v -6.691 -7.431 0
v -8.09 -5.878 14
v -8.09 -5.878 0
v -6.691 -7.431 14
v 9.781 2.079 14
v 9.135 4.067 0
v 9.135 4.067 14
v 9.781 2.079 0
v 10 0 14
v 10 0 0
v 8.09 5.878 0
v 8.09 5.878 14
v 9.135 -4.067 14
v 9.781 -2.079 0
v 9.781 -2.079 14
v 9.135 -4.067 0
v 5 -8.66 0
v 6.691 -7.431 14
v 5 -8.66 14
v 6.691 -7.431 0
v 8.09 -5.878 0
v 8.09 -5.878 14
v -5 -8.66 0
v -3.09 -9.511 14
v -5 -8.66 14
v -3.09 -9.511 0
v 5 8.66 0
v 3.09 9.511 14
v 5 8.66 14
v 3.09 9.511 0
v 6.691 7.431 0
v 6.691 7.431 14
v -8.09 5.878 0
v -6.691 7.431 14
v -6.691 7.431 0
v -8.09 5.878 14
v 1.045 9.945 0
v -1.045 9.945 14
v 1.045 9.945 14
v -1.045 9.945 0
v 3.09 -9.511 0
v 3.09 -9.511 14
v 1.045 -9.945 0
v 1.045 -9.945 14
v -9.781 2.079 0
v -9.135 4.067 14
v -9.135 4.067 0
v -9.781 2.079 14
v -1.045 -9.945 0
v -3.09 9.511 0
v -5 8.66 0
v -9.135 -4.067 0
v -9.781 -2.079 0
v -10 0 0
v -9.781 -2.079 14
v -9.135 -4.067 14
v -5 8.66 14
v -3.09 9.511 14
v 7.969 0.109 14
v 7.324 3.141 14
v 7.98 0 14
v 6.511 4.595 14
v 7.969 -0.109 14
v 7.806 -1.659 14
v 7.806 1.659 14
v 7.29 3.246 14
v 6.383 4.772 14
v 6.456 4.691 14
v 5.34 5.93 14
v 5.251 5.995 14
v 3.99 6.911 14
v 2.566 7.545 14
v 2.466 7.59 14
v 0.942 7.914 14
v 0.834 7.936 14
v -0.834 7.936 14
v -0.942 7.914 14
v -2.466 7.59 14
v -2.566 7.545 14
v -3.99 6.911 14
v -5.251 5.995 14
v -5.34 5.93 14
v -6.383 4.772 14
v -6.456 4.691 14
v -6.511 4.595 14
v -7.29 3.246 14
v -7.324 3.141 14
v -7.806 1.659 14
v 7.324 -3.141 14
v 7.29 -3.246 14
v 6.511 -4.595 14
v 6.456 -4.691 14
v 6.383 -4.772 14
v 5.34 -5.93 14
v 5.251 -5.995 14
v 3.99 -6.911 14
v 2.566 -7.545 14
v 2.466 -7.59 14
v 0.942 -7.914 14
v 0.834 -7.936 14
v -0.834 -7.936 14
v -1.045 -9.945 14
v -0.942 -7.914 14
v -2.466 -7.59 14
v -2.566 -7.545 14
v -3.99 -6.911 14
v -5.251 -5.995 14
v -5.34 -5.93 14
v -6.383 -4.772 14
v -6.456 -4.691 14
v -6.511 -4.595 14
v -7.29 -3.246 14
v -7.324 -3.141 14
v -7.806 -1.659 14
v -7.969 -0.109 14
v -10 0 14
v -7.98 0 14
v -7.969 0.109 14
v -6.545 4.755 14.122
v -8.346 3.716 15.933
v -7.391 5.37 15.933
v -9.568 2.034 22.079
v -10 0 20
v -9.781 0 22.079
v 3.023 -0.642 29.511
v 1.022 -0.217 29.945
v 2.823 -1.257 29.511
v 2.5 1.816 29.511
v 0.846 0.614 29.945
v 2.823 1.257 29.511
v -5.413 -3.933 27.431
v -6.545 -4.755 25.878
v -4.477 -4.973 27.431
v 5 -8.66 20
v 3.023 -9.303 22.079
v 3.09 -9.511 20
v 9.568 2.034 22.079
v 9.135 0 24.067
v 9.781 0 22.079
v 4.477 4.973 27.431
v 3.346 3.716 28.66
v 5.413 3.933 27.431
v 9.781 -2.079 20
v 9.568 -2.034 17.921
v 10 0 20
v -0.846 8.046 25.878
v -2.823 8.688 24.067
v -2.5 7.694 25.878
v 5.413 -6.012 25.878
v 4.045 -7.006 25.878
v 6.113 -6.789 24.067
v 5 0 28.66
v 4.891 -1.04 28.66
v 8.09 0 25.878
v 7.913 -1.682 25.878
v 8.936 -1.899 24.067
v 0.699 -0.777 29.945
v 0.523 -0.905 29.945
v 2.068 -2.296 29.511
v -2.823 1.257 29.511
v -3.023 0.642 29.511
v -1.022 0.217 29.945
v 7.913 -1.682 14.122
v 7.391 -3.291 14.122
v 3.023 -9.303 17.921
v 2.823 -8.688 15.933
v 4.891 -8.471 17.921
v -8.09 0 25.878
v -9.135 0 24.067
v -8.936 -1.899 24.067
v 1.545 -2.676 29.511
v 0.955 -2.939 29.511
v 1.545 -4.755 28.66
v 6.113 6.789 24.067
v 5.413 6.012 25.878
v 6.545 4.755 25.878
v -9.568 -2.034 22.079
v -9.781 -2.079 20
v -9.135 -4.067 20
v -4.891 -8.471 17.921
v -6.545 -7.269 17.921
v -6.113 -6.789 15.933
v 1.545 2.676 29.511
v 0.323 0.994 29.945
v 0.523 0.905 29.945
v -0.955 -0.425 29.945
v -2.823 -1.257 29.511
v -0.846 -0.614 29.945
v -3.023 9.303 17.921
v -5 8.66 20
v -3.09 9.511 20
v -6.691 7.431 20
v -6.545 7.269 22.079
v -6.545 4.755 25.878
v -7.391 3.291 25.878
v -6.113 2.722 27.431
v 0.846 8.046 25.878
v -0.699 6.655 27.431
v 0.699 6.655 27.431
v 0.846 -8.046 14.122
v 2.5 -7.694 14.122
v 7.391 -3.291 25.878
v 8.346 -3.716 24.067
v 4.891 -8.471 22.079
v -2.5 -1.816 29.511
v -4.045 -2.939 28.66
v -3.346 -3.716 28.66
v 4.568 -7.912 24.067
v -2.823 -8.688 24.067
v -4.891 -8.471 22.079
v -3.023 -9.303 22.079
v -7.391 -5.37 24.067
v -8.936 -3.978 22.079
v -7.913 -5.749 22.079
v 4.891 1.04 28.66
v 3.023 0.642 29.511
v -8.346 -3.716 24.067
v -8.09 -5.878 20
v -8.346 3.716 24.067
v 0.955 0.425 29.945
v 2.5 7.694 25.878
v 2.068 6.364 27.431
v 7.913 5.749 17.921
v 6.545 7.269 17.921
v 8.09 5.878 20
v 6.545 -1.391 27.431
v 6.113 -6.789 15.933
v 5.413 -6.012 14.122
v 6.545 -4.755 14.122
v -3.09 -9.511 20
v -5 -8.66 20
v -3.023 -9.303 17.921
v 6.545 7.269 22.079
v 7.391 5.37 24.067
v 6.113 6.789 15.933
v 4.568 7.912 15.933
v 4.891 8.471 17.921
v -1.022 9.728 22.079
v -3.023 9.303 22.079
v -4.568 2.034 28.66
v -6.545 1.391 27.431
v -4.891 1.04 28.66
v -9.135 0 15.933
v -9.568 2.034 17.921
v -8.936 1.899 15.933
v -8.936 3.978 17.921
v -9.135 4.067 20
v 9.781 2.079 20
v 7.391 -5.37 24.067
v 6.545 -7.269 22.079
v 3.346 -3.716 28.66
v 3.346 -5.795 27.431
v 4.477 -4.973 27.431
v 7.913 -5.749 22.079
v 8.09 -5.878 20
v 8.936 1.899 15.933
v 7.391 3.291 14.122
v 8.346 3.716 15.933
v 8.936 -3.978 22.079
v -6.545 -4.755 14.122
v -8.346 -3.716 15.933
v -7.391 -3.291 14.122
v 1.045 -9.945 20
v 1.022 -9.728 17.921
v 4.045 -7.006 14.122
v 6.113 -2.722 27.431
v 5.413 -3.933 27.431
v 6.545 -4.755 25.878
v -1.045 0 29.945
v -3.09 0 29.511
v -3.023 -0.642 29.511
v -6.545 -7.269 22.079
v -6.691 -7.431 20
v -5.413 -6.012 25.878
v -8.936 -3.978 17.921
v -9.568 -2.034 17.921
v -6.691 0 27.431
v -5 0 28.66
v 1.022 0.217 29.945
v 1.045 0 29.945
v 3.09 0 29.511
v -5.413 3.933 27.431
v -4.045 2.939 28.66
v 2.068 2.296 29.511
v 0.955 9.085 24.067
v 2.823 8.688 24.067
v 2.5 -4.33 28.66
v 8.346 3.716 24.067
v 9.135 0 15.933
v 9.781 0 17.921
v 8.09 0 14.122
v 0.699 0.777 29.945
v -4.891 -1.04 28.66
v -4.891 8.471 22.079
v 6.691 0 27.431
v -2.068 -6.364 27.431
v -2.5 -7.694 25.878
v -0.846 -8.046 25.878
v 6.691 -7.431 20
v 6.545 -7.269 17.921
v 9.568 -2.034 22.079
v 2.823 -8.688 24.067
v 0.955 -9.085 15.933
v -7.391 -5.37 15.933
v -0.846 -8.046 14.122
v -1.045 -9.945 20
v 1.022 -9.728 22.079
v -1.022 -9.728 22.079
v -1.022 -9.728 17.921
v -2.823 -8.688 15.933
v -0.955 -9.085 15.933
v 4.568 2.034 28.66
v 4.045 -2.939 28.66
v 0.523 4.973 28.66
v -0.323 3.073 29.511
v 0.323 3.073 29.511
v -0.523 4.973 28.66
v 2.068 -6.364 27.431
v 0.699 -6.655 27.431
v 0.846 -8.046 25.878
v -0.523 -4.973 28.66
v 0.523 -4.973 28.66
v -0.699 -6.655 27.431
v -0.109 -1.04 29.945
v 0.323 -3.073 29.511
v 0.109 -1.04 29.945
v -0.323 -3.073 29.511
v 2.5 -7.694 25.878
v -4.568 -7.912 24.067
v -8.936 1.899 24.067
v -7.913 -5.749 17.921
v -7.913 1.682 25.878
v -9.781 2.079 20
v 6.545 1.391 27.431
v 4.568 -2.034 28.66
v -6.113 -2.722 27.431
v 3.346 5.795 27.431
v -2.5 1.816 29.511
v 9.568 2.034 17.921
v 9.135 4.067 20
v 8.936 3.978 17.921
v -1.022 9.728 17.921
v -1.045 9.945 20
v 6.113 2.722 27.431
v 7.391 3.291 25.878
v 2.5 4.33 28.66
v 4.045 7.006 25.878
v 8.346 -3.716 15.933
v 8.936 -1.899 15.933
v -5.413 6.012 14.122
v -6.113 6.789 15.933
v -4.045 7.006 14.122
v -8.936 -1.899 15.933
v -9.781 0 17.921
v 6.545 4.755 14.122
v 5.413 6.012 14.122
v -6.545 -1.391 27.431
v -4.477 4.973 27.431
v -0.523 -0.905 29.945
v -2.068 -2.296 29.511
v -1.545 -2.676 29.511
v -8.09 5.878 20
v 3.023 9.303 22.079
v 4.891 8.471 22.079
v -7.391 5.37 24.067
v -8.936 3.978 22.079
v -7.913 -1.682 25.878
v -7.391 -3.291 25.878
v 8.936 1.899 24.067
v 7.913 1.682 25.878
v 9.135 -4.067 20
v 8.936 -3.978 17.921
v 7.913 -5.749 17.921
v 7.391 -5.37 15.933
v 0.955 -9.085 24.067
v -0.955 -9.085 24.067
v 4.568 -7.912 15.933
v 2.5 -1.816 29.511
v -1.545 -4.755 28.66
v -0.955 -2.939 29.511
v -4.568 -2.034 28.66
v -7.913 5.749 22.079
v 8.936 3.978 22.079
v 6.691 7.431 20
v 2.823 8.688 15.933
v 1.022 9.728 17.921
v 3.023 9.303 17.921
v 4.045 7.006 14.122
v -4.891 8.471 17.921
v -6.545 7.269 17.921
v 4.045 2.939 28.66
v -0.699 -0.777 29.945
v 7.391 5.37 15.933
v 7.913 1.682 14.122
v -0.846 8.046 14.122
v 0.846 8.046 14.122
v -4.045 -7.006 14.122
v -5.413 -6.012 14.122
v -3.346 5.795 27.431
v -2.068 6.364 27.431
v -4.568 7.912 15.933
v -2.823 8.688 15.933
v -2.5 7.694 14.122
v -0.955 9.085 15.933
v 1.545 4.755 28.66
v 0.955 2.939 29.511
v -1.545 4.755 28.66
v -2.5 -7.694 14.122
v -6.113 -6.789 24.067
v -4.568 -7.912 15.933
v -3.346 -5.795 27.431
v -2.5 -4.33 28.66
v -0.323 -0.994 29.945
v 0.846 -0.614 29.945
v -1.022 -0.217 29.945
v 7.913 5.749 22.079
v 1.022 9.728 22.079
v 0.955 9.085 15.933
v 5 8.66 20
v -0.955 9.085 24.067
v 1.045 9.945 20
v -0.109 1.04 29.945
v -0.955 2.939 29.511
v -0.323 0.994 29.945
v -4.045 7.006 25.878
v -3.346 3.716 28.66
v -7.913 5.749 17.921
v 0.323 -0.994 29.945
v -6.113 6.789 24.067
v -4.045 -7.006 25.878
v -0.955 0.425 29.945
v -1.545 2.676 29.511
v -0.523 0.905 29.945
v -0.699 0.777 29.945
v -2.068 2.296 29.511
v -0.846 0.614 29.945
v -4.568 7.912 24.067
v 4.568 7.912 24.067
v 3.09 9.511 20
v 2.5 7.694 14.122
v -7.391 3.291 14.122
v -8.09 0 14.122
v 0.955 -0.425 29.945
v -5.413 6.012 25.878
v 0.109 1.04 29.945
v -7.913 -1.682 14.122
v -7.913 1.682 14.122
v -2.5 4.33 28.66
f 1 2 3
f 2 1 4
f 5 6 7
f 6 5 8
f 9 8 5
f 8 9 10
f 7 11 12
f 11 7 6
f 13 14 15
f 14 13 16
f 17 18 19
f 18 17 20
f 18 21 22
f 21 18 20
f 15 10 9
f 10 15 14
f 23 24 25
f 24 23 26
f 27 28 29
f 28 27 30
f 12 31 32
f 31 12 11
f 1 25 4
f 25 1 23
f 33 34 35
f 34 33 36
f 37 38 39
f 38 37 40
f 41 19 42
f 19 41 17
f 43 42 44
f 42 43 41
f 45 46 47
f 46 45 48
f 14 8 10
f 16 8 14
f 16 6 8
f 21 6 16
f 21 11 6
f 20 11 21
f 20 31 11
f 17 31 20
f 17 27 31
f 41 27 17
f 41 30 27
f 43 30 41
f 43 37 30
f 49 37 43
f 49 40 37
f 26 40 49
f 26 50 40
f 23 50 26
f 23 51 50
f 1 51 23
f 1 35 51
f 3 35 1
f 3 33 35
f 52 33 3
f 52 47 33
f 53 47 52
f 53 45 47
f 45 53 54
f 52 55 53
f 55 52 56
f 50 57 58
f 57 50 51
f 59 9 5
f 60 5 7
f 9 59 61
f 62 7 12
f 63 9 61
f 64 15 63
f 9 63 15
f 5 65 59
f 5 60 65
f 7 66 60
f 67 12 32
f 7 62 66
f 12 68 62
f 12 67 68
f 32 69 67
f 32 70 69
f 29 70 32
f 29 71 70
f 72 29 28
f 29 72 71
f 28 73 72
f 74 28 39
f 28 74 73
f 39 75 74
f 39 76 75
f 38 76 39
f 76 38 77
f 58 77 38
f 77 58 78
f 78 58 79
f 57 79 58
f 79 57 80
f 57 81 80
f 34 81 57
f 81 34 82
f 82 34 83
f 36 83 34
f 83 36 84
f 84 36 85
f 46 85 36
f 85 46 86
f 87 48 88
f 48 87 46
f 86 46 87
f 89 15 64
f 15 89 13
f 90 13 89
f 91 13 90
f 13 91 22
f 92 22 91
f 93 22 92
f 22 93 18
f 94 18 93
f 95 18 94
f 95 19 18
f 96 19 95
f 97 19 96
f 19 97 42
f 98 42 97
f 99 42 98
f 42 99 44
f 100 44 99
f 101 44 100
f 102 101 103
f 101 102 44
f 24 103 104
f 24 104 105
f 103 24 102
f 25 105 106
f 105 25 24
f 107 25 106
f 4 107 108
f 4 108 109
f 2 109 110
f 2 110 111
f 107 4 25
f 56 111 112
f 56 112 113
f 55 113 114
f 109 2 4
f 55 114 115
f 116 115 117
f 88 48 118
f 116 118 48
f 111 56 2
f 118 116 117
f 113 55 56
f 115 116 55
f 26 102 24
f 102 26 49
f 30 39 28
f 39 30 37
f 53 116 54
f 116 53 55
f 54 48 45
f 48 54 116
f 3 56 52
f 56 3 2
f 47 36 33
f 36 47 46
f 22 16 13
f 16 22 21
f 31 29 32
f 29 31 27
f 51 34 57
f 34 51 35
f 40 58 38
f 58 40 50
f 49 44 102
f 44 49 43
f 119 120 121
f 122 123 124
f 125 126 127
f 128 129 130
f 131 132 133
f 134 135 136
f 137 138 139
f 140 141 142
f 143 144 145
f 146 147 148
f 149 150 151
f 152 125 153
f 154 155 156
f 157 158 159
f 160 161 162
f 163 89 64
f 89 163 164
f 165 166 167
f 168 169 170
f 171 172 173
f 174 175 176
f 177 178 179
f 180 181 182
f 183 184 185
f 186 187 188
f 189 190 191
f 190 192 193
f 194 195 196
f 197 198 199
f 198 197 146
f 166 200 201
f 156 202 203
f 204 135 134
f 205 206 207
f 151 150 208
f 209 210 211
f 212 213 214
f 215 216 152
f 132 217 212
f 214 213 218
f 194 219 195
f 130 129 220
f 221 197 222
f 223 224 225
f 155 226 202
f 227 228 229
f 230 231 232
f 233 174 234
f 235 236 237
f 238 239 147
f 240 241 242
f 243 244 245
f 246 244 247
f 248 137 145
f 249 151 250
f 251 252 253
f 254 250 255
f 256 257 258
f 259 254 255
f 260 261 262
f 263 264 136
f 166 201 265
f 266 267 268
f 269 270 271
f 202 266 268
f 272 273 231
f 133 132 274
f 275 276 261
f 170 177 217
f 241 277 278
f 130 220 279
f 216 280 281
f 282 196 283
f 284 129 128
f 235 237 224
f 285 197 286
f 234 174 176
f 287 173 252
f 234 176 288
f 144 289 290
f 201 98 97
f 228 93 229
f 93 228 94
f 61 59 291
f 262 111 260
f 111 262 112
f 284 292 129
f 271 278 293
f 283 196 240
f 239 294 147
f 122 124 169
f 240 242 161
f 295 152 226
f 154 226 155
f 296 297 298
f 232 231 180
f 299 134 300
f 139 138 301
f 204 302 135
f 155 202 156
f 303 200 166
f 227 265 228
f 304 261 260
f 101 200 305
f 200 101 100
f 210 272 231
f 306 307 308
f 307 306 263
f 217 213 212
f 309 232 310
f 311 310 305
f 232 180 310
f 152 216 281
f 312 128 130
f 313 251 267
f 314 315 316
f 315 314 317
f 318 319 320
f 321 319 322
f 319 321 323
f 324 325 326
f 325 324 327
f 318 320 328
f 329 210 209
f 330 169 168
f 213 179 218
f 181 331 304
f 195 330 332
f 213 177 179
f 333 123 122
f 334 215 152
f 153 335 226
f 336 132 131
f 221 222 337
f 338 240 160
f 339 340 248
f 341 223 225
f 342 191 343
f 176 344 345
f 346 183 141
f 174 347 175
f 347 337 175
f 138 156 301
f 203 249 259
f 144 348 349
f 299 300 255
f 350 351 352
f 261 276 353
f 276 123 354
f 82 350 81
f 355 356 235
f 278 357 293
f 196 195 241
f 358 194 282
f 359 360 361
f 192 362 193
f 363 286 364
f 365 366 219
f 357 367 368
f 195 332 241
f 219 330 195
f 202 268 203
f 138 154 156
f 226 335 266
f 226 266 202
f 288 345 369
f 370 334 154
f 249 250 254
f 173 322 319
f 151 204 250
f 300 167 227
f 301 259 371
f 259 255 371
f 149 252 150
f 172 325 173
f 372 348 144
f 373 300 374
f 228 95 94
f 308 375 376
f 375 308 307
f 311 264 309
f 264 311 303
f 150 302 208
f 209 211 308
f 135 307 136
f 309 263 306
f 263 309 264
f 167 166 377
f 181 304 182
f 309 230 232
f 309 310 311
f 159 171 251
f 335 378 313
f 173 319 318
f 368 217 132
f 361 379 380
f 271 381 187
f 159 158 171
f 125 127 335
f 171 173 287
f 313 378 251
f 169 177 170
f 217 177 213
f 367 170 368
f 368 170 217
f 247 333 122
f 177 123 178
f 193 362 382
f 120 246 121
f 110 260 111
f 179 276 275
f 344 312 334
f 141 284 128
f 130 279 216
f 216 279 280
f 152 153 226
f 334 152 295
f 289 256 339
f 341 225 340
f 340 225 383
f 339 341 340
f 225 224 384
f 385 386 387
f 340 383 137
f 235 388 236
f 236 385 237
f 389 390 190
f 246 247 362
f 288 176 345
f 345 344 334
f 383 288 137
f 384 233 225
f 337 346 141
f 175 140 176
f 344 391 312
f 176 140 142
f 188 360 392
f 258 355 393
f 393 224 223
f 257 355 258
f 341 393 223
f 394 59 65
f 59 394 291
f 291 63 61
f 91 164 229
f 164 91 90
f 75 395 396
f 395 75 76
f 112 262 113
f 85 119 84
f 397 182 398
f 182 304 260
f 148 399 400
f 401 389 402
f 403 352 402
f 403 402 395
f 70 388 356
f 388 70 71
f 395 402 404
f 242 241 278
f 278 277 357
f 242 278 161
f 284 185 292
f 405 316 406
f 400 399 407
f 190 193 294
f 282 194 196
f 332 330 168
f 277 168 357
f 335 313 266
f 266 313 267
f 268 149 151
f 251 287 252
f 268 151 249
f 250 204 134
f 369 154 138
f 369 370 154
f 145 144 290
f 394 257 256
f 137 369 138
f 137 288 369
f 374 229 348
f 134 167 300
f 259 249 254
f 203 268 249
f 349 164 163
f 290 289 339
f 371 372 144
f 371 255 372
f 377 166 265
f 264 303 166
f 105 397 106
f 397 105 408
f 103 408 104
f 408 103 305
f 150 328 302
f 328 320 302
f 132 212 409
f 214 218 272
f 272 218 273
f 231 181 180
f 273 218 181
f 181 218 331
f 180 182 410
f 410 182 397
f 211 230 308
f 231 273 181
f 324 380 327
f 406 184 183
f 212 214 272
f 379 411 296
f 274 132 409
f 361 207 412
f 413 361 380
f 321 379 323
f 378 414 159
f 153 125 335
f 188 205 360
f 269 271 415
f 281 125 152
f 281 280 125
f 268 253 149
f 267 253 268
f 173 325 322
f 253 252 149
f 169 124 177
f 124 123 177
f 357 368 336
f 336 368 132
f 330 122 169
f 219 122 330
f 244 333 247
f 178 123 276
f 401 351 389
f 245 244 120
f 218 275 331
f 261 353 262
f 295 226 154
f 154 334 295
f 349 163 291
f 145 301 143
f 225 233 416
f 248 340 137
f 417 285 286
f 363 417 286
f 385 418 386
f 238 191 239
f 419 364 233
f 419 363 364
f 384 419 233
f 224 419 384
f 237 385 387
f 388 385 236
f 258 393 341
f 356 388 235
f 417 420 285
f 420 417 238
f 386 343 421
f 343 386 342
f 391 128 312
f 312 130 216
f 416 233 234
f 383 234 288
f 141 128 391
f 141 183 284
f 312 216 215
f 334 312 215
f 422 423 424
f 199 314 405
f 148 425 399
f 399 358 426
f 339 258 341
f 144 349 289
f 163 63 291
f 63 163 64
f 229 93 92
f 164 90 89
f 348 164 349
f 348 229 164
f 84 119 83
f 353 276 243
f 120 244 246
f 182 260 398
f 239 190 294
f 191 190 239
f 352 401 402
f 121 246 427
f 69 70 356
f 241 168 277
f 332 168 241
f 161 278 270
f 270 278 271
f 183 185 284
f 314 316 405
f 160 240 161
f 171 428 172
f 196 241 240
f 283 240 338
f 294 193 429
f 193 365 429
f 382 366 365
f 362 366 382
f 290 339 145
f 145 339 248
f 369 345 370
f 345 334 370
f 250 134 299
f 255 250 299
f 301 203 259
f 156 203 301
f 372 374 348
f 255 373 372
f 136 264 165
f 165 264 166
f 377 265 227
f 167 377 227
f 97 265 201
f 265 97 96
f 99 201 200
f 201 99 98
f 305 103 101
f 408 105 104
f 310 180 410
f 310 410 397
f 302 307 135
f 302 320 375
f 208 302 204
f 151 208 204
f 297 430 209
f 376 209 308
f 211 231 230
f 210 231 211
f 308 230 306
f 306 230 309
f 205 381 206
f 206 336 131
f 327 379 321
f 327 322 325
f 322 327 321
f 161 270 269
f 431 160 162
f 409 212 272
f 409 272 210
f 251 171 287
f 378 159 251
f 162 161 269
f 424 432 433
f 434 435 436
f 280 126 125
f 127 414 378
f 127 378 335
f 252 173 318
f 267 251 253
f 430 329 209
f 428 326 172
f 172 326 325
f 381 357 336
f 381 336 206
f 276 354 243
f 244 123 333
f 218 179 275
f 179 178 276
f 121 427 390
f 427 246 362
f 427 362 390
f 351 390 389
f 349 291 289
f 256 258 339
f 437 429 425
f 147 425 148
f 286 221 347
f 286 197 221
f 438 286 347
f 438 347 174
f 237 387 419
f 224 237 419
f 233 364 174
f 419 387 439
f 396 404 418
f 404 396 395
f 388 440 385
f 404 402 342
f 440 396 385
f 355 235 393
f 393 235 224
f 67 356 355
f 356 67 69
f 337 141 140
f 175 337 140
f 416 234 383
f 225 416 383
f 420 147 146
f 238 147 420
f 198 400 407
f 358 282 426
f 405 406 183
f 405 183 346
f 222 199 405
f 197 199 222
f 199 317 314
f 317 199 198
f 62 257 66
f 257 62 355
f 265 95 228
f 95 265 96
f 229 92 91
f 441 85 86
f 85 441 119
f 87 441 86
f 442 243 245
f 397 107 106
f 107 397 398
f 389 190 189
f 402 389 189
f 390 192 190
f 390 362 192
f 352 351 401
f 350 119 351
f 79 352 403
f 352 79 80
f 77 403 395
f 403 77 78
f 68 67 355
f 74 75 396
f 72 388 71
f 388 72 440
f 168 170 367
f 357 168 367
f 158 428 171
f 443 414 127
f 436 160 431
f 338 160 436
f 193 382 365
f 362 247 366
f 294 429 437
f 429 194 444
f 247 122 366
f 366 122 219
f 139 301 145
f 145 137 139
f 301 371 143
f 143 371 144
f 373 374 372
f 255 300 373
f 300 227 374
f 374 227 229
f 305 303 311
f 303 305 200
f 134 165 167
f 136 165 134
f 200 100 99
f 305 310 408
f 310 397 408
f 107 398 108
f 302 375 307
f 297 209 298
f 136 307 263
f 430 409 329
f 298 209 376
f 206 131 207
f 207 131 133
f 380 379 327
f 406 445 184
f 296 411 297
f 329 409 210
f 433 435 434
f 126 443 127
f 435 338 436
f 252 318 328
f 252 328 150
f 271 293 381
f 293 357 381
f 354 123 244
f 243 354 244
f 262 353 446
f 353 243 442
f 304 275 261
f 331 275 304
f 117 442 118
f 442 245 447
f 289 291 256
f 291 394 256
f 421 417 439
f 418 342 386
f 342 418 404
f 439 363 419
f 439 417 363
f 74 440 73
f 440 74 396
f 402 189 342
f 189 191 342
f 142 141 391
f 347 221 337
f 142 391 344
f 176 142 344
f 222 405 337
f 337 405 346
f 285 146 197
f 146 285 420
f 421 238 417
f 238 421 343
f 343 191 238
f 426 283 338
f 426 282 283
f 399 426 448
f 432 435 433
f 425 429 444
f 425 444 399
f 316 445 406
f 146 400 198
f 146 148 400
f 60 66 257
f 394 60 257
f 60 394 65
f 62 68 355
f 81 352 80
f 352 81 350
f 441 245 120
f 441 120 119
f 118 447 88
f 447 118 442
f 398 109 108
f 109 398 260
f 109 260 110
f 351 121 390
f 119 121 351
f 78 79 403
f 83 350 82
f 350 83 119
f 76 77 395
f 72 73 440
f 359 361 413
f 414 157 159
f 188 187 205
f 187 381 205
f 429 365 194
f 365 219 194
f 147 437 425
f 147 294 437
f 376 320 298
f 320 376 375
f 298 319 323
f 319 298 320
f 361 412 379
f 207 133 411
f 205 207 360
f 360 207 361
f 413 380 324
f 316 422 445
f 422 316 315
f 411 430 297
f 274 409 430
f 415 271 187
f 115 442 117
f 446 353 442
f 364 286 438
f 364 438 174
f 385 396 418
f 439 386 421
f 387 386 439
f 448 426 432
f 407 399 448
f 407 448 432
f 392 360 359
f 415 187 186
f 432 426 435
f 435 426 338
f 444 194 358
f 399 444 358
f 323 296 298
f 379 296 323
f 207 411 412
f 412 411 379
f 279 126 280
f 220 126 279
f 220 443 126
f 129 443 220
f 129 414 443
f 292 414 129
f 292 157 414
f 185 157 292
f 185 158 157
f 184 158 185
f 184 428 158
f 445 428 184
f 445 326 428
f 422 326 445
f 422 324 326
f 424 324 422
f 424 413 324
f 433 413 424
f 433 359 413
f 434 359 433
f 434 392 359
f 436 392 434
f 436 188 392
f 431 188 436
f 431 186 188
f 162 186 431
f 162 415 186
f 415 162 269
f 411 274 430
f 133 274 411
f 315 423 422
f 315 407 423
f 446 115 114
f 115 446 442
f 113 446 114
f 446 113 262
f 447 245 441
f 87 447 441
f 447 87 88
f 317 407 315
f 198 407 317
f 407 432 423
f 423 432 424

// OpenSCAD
cylinder(h=14,r=10, $fn=30);
translate([0,0,20]) {
  sphere(r=10,$fs=1);
}
